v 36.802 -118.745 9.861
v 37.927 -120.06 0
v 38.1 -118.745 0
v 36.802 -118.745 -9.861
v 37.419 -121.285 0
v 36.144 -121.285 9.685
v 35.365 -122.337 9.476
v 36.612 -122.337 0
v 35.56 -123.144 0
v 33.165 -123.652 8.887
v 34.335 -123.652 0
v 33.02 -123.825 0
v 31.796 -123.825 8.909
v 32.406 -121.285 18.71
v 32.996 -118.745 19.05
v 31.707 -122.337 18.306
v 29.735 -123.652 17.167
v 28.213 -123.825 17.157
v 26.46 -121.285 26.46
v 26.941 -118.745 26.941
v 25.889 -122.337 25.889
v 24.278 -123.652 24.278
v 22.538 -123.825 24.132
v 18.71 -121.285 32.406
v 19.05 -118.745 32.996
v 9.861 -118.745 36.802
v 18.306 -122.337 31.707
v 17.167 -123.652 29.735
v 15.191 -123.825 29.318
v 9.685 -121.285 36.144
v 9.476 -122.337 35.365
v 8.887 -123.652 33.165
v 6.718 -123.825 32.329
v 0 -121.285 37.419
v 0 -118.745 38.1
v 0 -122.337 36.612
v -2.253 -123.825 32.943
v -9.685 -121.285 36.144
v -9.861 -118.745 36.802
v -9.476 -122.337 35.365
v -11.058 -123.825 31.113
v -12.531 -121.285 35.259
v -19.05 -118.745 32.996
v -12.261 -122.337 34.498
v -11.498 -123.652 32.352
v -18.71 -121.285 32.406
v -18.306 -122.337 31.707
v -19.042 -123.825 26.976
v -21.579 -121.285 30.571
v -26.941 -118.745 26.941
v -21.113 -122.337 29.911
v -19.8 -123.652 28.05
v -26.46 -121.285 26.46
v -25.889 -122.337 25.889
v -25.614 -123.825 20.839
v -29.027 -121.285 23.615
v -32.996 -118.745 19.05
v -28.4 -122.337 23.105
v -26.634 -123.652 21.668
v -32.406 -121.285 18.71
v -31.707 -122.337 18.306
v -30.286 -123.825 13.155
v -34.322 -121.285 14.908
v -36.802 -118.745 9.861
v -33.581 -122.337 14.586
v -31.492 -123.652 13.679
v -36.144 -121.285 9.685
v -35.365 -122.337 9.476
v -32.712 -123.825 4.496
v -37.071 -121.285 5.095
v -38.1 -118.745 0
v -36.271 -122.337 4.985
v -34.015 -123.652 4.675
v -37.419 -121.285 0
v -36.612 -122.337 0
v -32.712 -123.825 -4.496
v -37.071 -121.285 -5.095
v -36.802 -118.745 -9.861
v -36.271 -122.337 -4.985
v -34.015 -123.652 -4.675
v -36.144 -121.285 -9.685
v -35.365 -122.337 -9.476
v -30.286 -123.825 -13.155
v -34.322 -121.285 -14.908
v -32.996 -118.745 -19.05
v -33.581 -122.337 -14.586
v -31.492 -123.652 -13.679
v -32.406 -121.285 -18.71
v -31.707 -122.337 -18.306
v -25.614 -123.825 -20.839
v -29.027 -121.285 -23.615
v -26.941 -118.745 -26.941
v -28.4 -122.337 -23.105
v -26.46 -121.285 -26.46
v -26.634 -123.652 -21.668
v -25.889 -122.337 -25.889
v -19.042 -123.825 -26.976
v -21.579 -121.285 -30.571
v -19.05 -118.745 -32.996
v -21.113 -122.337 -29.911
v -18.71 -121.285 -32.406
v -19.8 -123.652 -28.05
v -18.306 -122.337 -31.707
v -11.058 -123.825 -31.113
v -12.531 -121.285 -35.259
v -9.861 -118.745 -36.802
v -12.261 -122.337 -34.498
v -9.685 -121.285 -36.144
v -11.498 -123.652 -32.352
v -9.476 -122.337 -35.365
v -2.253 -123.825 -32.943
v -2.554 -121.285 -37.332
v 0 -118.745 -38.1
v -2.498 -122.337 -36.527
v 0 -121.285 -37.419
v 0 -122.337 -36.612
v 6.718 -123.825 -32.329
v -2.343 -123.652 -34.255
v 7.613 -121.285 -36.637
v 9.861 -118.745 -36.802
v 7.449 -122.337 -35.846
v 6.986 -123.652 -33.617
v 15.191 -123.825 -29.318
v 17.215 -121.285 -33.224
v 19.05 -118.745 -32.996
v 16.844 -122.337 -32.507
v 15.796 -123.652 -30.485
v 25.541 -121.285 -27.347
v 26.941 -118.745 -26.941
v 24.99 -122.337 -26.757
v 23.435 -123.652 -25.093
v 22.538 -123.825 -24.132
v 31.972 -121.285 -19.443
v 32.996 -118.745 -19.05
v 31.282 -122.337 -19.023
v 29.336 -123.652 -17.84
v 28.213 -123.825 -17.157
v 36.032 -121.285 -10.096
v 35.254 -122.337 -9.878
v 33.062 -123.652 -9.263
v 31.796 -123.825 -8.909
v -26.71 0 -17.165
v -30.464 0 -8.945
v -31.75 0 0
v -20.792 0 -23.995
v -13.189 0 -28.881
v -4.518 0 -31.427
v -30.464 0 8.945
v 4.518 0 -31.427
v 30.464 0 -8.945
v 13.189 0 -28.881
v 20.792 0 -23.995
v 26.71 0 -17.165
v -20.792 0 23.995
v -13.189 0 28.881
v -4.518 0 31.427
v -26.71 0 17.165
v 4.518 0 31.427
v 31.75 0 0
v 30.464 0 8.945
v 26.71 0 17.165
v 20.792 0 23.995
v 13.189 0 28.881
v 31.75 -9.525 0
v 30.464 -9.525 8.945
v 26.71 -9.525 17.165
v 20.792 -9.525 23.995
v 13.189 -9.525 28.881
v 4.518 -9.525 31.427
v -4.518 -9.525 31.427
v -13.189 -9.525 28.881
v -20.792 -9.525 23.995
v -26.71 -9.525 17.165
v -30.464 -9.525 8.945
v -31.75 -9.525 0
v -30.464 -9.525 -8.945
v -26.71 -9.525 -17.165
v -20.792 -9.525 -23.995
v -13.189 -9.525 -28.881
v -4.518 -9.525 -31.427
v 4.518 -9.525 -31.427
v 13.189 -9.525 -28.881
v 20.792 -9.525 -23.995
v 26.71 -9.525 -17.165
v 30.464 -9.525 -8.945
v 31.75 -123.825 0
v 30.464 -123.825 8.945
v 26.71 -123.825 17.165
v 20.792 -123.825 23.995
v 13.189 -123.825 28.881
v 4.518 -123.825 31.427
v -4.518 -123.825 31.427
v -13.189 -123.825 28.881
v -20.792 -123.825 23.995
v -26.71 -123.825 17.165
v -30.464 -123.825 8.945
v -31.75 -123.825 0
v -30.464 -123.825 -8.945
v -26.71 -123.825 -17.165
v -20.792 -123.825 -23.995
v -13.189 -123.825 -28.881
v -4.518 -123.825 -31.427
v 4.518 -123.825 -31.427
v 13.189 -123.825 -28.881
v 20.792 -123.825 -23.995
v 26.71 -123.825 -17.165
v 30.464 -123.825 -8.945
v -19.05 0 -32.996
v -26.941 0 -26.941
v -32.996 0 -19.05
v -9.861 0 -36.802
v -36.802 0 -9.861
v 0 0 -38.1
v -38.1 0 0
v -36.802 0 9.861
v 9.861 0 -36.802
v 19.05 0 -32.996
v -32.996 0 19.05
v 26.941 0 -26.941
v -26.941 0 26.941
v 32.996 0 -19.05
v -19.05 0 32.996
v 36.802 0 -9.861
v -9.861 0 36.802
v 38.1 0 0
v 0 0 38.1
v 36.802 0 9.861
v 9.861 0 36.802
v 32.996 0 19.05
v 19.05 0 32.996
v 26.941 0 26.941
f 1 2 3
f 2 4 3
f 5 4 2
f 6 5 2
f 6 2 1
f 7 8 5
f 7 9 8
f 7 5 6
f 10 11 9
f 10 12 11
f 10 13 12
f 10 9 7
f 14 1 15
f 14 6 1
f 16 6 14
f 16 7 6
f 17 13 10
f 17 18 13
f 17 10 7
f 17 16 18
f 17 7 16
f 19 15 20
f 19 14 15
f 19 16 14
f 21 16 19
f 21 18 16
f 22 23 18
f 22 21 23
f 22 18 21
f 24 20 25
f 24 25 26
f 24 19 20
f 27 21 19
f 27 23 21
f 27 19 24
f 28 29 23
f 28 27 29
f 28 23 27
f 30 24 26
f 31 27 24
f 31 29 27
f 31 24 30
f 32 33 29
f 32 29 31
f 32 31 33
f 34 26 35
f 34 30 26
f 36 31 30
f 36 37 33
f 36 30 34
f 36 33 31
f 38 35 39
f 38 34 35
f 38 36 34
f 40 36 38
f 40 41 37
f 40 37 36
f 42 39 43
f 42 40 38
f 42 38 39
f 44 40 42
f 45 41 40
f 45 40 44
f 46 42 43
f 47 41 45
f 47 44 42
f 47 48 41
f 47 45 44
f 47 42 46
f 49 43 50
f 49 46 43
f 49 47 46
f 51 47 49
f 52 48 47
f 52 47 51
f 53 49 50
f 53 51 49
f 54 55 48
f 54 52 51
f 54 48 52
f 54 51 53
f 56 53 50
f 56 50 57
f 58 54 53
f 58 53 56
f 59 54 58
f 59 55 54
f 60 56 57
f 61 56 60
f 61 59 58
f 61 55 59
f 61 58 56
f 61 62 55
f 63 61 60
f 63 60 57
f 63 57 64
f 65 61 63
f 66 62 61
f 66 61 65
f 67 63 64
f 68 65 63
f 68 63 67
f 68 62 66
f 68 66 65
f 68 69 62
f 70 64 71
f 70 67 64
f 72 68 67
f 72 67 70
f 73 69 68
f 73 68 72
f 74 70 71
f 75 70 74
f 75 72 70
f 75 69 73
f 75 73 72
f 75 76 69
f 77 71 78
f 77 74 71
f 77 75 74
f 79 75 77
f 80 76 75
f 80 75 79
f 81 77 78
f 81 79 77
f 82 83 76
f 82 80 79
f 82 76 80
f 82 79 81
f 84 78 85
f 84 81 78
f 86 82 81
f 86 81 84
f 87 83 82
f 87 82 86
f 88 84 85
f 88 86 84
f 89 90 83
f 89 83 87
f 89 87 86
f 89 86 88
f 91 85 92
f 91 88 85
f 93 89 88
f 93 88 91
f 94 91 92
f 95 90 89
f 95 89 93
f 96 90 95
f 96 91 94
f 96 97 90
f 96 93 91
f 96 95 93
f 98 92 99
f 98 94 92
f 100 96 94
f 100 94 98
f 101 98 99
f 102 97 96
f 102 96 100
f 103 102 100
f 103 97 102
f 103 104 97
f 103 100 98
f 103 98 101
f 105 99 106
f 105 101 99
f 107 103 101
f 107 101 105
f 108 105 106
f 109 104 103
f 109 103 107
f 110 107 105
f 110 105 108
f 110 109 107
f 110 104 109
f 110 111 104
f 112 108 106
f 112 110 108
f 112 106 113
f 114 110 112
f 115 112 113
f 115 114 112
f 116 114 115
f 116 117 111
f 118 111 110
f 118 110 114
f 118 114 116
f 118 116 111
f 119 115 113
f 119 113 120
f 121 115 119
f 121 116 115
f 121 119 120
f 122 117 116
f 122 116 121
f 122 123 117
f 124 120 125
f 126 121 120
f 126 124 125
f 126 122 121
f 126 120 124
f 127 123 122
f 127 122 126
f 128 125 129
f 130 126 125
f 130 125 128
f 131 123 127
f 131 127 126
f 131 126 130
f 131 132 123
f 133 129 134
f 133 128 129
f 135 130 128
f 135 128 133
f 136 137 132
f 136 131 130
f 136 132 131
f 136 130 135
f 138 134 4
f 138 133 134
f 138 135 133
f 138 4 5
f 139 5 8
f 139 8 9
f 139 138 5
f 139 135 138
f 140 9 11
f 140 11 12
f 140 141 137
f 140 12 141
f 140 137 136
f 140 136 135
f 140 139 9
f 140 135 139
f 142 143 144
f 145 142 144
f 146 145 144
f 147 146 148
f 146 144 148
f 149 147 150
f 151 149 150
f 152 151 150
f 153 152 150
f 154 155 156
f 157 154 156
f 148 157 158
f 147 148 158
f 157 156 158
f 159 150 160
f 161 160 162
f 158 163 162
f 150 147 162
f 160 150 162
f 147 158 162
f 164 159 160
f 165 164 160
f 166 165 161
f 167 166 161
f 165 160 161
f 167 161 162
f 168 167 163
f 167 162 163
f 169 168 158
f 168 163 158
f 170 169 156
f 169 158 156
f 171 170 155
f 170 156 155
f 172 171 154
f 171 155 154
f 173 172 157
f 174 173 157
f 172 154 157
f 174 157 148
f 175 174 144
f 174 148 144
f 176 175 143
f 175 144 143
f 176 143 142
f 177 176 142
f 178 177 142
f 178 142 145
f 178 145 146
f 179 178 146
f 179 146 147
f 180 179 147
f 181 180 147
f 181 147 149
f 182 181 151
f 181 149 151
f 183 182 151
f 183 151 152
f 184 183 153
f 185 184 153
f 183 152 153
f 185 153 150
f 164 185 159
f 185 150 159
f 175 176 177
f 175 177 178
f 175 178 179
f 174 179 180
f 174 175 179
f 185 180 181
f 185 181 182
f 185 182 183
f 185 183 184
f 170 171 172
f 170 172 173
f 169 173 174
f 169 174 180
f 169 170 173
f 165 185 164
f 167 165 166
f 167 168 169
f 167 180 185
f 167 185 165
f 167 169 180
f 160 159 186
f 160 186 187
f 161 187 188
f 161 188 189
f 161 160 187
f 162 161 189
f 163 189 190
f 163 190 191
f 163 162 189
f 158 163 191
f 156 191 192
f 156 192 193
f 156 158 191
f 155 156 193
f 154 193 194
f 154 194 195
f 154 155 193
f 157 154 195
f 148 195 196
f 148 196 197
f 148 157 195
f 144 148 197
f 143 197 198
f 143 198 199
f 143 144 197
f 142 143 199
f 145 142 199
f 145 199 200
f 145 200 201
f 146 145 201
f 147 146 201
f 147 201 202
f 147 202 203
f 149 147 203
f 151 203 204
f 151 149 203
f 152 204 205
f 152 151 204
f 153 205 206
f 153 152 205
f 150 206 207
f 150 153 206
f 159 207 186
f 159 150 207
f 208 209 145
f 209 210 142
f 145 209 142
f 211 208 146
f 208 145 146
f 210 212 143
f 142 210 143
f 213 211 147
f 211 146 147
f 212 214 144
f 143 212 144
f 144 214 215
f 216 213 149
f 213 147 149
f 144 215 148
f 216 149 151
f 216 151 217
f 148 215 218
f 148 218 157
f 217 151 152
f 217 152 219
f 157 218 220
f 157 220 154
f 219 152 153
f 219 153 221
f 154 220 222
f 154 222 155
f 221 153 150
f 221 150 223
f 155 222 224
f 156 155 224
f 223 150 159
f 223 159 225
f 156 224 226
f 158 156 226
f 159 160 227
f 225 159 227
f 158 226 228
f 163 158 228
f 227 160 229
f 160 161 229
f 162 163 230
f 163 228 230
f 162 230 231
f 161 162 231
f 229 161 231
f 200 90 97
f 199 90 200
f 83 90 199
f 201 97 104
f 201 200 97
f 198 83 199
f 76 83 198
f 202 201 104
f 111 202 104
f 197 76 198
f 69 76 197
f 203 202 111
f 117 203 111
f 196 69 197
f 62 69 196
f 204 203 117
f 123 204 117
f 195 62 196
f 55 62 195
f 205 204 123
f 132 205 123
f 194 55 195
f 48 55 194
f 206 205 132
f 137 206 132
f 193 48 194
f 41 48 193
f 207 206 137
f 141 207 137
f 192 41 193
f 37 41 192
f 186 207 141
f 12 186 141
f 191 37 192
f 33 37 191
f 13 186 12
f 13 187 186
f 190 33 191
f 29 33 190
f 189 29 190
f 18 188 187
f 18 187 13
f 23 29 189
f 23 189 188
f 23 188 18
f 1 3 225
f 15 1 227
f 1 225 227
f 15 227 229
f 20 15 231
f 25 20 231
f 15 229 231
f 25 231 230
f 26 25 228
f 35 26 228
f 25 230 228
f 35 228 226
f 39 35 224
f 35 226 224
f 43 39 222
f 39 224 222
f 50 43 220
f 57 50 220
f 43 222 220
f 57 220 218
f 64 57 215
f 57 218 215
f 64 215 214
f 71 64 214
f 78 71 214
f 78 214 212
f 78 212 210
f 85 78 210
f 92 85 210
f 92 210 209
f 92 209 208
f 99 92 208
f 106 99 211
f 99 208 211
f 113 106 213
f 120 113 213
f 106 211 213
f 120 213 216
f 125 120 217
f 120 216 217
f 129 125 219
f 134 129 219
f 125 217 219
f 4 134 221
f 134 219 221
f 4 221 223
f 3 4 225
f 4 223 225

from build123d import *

# Parameters (mm, degrees)
F0_R     = 38.1
F0_R_2   = 31.75
F1_DEPTH = 123.825
F2_DEPTH = 9.525
F3_R     = 5.08


with BuildPart() as f1:
    # F0 (on Front) → F1 (new body)
    with BuildSketch(Plane.XZ):
        Circle(F0_R)
        Circle(F0_R_2, mode=Mode.SUBTRACT)
    extrude(amount=F1_DEPTH)

    # F3
    f3_edges = [f1.edges().sort_by_distance(p)[0] for p in [
        (-38.1, -123.825, 0),
    ]]
    fillet(f3_edges, radius=F3_R)


with BuildPart() as f2:
    # F0 (on Front) → F2 (new body)
    with BuildSketch(Plane.XZ):
        Circle(F0_R_2)
    extrude(amount=F2_DEPTH)


solid = Compound([f1.part, f2.part])
